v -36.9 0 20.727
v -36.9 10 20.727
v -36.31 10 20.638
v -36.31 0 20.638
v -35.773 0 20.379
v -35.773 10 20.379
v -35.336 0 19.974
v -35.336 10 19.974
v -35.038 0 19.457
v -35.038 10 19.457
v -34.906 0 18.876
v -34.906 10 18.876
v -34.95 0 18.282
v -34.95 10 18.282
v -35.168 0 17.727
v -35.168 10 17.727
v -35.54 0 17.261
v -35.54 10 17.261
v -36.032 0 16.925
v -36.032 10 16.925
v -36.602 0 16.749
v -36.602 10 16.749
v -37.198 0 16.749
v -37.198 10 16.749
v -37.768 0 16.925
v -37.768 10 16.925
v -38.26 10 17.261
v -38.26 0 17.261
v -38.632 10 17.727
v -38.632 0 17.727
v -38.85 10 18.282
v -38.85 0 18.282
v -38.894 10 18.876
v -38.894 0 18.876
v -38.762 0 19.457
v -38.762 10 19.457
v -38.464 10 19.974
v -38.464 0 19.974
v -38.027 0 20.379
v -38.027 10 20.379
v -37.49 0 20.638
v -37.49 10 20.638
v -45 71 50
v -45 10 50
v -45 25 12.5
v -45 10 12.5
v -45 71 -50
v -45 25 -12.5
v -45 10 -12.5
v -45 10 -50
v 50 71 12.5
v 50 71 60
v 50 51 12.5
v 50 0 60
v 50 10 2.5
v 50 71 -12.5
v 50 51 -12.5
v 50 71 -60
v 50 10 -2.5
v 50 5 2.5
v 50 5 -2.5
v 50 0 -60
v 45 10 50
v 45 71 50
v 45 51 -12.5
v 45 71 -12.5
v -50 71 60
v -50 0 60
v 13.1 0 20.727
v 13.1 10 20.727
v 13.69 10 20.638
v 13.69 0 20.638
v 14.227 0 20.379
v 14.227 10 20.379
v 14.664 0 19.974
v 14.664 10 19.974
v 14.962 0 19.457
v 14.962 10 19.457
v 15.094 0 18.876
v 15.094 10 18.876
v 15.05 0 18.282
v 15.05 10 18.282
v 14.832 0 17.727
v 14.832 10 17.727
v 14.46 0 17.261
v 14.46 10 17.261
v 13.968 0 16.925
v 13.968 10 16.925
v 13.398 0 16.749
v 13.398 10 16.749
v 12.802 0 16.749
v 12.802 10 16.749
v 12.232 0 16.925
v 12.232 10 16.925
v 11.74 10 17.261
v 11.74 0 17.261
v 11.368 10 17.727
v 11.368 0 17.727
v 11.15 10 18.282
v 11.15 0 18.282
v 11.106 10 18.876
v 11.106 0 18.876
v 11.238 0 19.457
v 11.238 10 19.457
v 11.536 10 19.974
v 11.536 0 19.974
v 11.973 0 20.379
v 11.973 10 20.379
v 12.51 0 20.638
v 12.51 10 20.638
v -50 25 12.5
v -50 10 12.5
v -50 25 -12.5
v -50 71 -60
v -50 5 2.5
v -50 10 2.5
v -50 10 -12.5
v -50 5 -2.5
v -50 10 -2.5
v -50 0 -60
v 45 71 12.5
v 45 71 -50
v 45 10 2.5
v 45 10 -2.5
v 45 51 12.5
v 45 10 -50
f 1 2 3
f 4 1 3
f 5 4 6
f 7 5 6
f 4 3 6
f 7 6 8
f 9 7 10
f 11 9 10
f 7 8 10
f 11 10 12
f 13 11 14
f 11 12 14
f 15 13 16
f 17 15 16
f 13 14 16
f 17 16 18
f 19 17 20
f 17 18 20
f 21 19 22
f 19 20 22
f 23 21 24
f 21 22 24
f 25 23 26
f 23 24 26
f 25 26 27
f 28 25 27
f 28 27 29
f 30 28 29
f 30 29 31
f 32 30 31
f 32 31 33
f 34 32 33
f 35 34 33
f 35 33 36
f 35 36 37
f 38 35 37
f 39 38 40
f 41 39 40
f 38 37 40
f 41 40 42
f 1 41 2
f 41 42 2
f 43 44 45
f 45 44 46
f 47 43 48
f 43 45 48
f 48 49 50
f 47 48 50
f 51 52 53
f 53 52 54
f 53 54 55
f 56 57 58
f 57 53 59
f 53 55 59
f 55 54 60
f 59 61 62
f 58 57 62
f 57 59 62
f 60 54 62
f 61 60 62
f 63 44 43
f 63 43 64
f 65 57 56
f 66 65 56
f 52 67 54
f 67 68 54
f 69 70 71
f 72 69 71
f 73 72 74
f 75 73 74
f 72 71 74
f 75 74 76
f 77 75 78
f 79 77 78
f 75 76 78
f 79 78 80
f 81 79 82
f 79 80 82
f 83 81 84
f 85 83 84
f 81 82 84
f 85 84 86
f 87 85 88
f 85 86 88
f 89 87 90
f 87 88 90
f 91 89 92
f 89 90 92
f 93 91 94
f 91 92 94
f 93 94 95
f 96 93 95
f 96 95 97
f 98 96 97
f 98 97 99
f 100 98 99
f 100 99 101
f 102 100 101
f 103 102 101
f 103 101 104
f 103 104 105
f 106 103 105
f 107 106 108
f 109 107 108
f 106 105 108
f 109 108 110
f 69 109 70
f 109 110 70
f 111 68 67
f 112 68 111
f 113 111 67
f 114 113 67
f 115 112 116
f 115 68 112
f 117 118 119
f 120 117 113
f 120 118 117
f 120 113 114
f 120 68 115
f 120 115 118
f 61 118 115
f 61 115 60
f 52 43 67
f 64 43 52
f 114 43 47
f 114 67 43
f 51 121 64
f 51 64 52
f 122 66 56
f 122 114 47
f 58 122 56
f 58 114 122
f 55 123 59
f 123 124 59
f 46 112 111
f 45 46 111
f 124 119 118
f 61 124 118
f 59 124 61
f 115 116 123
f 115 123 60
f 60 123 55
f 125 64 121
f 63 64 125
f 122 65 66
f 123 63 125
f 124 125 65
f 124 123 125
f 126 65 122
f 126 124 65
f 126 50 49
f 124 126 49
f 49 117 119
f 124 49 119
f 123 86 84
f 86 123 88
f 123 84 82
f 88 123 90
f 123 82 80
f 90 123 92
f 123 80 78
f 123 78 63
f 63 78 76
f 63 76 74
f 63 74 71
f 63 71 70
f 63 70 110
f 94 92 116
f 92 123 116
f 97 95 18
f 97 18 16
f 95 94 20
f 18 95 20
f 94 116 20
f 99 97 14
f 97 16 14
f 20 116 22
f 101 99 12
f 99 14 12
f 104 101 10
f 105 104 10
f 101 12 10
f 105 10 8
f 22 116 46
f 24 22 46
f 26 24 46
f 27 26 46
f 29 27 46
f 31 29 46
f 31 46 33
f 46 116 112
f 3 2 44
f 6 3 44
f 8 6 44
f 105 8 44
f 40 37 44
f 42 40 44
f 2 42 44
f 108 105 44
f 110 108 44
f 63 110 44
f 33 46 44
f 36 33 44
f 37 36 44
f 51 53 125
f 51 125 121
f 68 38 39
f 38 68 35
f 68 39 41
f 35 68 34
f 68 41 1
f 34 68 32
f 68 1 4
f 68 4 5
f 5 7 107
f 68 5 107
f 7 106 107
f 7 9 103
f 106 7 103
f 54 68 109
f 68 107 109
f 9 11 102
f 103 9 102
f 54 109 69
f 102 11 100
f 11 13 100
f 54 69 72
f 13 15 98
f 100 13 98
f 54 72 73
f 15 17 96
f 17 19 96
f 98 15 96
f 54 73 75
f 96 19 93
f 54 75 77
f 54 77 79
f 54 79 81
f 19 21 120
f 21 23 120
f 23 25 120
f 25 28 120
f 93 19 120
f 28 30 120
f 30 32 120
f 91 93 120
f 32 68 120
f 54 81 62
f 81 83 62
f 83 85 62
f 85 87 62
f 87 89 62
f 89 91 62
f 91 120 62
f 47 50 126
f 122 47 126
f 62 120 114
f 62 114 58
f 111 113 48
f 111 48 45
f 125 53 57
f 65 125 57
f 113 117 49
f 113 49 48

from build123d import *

# Parameters (mm, degrees)
SKETCH1_W           = 100
SKETCH1_H           = 120
BOSS_EXTRUDE1_DEPTH = 10
SKETCH2_W           = 100
SKETCH2_H           = 5
CUT_EXTRUDE1_DEPTH  = 5
SKETCH3_R           = 2
CUT_EXTRUDE2_DEPTH  = 10
SKETCH4_W           = 100
SKETCH4_H           = 120
SKETCH4_W_2         = 90
SKETCH4_H_2         = 100
BOSS_EXTRUDE2_DEPTH = 61
SKETCH5_W           = 25
SKETCH5_H           = 15
CUT_EXTRUDE3_DEPTH  = 29
SKETCH6_W           = 25
SKETCH6_H           = 20
CUT_EXTRUDE4_DEPTH  = 29


with BuildPart() as part:
    # Sketch1 → Boss-Extrude1 (new body)
    with BuildSketch(Plane(origin=(0, 0, 0), x_dir=(1, 0, 0), z_dir=(0, 1, 0))):
        Rectangle(SKETCH1_W, SKETCH1_H)
    extrude(amount=BOSS_EXTRUDE1_DEPTH)

    # Sketch2 → Cut-Extrude1 (cut)
    with BuildSketch(Plane(origin=(0, 10, 0), x_dir=(1, 0, 0), z_dir=(0, 1, 0))):
        Rectangle(SKETCH2_W, SKETCH2_H)
    extrude(amount=-CUT_EXTRUDE1_DEPTH, mode=Mode.SUBTRACT)

    # Sketch3 → Cut-Extrude2 (cut)
    with BuildSketch(Plane(origin=(0, 10, 0), x_dir=(1, 0, 0), z_dir=(0, 1, 0))):
        with Locations(Location((13.1, -18.726688176, 0), (0, 0, 270))):
            Circle(SKETCH3_R)
        with Locations(Location((-36.9, -18.726688176, 0), (0, 0, 270))):
            Circle(SKETCH3_R)
    extrude(amount=-CUT_EXTRUDE2_DEPTH, mode=Mode.SUBTRACT)

    # Sketch4 → Boss-Extrude2 (add)
    with BuildSketch(Plane(origin=(0, 10, 0), x_dir=(1, 0, 0), z_dir=(0, 1, 0))):
        Rectangle(SKETCH4_W, SKETCH4_H)
        Rectangle(SKETCH4_W_2, SKETCH4_H_2, mode=Mode.SUBTRACT)
    extrude(amount=BOSS_EXTRUDE2_DEPTH)

    # Sketch5 → Cut-Extrude3 (cut)
    with BuildSketch(Plane.ZY.offset(50)):
        with Locations((0, 17.5)):
            Rectangle(SKETCH5_W, SKETCH5_H)
    extrude(amount=-CUT_EXTRUDE3_DEPTH, mode=Mode.SUBTRACT)

    # Sketch6 → Cut-Extrude4 (cut)
    with BuildSketch(Plane(origin=(50, 0, 0), x_dir=(0, 0, -1), z_dir=(1, 0, 0))):
        with Locations((0, 61)):
            Rectangle(SKETCH6_W, SKETCH6_H)
    extrude(amount=-CUT_EXTRUDE4_DEPTH, mode=Mode.SUBTRACT)


solid = part.part
